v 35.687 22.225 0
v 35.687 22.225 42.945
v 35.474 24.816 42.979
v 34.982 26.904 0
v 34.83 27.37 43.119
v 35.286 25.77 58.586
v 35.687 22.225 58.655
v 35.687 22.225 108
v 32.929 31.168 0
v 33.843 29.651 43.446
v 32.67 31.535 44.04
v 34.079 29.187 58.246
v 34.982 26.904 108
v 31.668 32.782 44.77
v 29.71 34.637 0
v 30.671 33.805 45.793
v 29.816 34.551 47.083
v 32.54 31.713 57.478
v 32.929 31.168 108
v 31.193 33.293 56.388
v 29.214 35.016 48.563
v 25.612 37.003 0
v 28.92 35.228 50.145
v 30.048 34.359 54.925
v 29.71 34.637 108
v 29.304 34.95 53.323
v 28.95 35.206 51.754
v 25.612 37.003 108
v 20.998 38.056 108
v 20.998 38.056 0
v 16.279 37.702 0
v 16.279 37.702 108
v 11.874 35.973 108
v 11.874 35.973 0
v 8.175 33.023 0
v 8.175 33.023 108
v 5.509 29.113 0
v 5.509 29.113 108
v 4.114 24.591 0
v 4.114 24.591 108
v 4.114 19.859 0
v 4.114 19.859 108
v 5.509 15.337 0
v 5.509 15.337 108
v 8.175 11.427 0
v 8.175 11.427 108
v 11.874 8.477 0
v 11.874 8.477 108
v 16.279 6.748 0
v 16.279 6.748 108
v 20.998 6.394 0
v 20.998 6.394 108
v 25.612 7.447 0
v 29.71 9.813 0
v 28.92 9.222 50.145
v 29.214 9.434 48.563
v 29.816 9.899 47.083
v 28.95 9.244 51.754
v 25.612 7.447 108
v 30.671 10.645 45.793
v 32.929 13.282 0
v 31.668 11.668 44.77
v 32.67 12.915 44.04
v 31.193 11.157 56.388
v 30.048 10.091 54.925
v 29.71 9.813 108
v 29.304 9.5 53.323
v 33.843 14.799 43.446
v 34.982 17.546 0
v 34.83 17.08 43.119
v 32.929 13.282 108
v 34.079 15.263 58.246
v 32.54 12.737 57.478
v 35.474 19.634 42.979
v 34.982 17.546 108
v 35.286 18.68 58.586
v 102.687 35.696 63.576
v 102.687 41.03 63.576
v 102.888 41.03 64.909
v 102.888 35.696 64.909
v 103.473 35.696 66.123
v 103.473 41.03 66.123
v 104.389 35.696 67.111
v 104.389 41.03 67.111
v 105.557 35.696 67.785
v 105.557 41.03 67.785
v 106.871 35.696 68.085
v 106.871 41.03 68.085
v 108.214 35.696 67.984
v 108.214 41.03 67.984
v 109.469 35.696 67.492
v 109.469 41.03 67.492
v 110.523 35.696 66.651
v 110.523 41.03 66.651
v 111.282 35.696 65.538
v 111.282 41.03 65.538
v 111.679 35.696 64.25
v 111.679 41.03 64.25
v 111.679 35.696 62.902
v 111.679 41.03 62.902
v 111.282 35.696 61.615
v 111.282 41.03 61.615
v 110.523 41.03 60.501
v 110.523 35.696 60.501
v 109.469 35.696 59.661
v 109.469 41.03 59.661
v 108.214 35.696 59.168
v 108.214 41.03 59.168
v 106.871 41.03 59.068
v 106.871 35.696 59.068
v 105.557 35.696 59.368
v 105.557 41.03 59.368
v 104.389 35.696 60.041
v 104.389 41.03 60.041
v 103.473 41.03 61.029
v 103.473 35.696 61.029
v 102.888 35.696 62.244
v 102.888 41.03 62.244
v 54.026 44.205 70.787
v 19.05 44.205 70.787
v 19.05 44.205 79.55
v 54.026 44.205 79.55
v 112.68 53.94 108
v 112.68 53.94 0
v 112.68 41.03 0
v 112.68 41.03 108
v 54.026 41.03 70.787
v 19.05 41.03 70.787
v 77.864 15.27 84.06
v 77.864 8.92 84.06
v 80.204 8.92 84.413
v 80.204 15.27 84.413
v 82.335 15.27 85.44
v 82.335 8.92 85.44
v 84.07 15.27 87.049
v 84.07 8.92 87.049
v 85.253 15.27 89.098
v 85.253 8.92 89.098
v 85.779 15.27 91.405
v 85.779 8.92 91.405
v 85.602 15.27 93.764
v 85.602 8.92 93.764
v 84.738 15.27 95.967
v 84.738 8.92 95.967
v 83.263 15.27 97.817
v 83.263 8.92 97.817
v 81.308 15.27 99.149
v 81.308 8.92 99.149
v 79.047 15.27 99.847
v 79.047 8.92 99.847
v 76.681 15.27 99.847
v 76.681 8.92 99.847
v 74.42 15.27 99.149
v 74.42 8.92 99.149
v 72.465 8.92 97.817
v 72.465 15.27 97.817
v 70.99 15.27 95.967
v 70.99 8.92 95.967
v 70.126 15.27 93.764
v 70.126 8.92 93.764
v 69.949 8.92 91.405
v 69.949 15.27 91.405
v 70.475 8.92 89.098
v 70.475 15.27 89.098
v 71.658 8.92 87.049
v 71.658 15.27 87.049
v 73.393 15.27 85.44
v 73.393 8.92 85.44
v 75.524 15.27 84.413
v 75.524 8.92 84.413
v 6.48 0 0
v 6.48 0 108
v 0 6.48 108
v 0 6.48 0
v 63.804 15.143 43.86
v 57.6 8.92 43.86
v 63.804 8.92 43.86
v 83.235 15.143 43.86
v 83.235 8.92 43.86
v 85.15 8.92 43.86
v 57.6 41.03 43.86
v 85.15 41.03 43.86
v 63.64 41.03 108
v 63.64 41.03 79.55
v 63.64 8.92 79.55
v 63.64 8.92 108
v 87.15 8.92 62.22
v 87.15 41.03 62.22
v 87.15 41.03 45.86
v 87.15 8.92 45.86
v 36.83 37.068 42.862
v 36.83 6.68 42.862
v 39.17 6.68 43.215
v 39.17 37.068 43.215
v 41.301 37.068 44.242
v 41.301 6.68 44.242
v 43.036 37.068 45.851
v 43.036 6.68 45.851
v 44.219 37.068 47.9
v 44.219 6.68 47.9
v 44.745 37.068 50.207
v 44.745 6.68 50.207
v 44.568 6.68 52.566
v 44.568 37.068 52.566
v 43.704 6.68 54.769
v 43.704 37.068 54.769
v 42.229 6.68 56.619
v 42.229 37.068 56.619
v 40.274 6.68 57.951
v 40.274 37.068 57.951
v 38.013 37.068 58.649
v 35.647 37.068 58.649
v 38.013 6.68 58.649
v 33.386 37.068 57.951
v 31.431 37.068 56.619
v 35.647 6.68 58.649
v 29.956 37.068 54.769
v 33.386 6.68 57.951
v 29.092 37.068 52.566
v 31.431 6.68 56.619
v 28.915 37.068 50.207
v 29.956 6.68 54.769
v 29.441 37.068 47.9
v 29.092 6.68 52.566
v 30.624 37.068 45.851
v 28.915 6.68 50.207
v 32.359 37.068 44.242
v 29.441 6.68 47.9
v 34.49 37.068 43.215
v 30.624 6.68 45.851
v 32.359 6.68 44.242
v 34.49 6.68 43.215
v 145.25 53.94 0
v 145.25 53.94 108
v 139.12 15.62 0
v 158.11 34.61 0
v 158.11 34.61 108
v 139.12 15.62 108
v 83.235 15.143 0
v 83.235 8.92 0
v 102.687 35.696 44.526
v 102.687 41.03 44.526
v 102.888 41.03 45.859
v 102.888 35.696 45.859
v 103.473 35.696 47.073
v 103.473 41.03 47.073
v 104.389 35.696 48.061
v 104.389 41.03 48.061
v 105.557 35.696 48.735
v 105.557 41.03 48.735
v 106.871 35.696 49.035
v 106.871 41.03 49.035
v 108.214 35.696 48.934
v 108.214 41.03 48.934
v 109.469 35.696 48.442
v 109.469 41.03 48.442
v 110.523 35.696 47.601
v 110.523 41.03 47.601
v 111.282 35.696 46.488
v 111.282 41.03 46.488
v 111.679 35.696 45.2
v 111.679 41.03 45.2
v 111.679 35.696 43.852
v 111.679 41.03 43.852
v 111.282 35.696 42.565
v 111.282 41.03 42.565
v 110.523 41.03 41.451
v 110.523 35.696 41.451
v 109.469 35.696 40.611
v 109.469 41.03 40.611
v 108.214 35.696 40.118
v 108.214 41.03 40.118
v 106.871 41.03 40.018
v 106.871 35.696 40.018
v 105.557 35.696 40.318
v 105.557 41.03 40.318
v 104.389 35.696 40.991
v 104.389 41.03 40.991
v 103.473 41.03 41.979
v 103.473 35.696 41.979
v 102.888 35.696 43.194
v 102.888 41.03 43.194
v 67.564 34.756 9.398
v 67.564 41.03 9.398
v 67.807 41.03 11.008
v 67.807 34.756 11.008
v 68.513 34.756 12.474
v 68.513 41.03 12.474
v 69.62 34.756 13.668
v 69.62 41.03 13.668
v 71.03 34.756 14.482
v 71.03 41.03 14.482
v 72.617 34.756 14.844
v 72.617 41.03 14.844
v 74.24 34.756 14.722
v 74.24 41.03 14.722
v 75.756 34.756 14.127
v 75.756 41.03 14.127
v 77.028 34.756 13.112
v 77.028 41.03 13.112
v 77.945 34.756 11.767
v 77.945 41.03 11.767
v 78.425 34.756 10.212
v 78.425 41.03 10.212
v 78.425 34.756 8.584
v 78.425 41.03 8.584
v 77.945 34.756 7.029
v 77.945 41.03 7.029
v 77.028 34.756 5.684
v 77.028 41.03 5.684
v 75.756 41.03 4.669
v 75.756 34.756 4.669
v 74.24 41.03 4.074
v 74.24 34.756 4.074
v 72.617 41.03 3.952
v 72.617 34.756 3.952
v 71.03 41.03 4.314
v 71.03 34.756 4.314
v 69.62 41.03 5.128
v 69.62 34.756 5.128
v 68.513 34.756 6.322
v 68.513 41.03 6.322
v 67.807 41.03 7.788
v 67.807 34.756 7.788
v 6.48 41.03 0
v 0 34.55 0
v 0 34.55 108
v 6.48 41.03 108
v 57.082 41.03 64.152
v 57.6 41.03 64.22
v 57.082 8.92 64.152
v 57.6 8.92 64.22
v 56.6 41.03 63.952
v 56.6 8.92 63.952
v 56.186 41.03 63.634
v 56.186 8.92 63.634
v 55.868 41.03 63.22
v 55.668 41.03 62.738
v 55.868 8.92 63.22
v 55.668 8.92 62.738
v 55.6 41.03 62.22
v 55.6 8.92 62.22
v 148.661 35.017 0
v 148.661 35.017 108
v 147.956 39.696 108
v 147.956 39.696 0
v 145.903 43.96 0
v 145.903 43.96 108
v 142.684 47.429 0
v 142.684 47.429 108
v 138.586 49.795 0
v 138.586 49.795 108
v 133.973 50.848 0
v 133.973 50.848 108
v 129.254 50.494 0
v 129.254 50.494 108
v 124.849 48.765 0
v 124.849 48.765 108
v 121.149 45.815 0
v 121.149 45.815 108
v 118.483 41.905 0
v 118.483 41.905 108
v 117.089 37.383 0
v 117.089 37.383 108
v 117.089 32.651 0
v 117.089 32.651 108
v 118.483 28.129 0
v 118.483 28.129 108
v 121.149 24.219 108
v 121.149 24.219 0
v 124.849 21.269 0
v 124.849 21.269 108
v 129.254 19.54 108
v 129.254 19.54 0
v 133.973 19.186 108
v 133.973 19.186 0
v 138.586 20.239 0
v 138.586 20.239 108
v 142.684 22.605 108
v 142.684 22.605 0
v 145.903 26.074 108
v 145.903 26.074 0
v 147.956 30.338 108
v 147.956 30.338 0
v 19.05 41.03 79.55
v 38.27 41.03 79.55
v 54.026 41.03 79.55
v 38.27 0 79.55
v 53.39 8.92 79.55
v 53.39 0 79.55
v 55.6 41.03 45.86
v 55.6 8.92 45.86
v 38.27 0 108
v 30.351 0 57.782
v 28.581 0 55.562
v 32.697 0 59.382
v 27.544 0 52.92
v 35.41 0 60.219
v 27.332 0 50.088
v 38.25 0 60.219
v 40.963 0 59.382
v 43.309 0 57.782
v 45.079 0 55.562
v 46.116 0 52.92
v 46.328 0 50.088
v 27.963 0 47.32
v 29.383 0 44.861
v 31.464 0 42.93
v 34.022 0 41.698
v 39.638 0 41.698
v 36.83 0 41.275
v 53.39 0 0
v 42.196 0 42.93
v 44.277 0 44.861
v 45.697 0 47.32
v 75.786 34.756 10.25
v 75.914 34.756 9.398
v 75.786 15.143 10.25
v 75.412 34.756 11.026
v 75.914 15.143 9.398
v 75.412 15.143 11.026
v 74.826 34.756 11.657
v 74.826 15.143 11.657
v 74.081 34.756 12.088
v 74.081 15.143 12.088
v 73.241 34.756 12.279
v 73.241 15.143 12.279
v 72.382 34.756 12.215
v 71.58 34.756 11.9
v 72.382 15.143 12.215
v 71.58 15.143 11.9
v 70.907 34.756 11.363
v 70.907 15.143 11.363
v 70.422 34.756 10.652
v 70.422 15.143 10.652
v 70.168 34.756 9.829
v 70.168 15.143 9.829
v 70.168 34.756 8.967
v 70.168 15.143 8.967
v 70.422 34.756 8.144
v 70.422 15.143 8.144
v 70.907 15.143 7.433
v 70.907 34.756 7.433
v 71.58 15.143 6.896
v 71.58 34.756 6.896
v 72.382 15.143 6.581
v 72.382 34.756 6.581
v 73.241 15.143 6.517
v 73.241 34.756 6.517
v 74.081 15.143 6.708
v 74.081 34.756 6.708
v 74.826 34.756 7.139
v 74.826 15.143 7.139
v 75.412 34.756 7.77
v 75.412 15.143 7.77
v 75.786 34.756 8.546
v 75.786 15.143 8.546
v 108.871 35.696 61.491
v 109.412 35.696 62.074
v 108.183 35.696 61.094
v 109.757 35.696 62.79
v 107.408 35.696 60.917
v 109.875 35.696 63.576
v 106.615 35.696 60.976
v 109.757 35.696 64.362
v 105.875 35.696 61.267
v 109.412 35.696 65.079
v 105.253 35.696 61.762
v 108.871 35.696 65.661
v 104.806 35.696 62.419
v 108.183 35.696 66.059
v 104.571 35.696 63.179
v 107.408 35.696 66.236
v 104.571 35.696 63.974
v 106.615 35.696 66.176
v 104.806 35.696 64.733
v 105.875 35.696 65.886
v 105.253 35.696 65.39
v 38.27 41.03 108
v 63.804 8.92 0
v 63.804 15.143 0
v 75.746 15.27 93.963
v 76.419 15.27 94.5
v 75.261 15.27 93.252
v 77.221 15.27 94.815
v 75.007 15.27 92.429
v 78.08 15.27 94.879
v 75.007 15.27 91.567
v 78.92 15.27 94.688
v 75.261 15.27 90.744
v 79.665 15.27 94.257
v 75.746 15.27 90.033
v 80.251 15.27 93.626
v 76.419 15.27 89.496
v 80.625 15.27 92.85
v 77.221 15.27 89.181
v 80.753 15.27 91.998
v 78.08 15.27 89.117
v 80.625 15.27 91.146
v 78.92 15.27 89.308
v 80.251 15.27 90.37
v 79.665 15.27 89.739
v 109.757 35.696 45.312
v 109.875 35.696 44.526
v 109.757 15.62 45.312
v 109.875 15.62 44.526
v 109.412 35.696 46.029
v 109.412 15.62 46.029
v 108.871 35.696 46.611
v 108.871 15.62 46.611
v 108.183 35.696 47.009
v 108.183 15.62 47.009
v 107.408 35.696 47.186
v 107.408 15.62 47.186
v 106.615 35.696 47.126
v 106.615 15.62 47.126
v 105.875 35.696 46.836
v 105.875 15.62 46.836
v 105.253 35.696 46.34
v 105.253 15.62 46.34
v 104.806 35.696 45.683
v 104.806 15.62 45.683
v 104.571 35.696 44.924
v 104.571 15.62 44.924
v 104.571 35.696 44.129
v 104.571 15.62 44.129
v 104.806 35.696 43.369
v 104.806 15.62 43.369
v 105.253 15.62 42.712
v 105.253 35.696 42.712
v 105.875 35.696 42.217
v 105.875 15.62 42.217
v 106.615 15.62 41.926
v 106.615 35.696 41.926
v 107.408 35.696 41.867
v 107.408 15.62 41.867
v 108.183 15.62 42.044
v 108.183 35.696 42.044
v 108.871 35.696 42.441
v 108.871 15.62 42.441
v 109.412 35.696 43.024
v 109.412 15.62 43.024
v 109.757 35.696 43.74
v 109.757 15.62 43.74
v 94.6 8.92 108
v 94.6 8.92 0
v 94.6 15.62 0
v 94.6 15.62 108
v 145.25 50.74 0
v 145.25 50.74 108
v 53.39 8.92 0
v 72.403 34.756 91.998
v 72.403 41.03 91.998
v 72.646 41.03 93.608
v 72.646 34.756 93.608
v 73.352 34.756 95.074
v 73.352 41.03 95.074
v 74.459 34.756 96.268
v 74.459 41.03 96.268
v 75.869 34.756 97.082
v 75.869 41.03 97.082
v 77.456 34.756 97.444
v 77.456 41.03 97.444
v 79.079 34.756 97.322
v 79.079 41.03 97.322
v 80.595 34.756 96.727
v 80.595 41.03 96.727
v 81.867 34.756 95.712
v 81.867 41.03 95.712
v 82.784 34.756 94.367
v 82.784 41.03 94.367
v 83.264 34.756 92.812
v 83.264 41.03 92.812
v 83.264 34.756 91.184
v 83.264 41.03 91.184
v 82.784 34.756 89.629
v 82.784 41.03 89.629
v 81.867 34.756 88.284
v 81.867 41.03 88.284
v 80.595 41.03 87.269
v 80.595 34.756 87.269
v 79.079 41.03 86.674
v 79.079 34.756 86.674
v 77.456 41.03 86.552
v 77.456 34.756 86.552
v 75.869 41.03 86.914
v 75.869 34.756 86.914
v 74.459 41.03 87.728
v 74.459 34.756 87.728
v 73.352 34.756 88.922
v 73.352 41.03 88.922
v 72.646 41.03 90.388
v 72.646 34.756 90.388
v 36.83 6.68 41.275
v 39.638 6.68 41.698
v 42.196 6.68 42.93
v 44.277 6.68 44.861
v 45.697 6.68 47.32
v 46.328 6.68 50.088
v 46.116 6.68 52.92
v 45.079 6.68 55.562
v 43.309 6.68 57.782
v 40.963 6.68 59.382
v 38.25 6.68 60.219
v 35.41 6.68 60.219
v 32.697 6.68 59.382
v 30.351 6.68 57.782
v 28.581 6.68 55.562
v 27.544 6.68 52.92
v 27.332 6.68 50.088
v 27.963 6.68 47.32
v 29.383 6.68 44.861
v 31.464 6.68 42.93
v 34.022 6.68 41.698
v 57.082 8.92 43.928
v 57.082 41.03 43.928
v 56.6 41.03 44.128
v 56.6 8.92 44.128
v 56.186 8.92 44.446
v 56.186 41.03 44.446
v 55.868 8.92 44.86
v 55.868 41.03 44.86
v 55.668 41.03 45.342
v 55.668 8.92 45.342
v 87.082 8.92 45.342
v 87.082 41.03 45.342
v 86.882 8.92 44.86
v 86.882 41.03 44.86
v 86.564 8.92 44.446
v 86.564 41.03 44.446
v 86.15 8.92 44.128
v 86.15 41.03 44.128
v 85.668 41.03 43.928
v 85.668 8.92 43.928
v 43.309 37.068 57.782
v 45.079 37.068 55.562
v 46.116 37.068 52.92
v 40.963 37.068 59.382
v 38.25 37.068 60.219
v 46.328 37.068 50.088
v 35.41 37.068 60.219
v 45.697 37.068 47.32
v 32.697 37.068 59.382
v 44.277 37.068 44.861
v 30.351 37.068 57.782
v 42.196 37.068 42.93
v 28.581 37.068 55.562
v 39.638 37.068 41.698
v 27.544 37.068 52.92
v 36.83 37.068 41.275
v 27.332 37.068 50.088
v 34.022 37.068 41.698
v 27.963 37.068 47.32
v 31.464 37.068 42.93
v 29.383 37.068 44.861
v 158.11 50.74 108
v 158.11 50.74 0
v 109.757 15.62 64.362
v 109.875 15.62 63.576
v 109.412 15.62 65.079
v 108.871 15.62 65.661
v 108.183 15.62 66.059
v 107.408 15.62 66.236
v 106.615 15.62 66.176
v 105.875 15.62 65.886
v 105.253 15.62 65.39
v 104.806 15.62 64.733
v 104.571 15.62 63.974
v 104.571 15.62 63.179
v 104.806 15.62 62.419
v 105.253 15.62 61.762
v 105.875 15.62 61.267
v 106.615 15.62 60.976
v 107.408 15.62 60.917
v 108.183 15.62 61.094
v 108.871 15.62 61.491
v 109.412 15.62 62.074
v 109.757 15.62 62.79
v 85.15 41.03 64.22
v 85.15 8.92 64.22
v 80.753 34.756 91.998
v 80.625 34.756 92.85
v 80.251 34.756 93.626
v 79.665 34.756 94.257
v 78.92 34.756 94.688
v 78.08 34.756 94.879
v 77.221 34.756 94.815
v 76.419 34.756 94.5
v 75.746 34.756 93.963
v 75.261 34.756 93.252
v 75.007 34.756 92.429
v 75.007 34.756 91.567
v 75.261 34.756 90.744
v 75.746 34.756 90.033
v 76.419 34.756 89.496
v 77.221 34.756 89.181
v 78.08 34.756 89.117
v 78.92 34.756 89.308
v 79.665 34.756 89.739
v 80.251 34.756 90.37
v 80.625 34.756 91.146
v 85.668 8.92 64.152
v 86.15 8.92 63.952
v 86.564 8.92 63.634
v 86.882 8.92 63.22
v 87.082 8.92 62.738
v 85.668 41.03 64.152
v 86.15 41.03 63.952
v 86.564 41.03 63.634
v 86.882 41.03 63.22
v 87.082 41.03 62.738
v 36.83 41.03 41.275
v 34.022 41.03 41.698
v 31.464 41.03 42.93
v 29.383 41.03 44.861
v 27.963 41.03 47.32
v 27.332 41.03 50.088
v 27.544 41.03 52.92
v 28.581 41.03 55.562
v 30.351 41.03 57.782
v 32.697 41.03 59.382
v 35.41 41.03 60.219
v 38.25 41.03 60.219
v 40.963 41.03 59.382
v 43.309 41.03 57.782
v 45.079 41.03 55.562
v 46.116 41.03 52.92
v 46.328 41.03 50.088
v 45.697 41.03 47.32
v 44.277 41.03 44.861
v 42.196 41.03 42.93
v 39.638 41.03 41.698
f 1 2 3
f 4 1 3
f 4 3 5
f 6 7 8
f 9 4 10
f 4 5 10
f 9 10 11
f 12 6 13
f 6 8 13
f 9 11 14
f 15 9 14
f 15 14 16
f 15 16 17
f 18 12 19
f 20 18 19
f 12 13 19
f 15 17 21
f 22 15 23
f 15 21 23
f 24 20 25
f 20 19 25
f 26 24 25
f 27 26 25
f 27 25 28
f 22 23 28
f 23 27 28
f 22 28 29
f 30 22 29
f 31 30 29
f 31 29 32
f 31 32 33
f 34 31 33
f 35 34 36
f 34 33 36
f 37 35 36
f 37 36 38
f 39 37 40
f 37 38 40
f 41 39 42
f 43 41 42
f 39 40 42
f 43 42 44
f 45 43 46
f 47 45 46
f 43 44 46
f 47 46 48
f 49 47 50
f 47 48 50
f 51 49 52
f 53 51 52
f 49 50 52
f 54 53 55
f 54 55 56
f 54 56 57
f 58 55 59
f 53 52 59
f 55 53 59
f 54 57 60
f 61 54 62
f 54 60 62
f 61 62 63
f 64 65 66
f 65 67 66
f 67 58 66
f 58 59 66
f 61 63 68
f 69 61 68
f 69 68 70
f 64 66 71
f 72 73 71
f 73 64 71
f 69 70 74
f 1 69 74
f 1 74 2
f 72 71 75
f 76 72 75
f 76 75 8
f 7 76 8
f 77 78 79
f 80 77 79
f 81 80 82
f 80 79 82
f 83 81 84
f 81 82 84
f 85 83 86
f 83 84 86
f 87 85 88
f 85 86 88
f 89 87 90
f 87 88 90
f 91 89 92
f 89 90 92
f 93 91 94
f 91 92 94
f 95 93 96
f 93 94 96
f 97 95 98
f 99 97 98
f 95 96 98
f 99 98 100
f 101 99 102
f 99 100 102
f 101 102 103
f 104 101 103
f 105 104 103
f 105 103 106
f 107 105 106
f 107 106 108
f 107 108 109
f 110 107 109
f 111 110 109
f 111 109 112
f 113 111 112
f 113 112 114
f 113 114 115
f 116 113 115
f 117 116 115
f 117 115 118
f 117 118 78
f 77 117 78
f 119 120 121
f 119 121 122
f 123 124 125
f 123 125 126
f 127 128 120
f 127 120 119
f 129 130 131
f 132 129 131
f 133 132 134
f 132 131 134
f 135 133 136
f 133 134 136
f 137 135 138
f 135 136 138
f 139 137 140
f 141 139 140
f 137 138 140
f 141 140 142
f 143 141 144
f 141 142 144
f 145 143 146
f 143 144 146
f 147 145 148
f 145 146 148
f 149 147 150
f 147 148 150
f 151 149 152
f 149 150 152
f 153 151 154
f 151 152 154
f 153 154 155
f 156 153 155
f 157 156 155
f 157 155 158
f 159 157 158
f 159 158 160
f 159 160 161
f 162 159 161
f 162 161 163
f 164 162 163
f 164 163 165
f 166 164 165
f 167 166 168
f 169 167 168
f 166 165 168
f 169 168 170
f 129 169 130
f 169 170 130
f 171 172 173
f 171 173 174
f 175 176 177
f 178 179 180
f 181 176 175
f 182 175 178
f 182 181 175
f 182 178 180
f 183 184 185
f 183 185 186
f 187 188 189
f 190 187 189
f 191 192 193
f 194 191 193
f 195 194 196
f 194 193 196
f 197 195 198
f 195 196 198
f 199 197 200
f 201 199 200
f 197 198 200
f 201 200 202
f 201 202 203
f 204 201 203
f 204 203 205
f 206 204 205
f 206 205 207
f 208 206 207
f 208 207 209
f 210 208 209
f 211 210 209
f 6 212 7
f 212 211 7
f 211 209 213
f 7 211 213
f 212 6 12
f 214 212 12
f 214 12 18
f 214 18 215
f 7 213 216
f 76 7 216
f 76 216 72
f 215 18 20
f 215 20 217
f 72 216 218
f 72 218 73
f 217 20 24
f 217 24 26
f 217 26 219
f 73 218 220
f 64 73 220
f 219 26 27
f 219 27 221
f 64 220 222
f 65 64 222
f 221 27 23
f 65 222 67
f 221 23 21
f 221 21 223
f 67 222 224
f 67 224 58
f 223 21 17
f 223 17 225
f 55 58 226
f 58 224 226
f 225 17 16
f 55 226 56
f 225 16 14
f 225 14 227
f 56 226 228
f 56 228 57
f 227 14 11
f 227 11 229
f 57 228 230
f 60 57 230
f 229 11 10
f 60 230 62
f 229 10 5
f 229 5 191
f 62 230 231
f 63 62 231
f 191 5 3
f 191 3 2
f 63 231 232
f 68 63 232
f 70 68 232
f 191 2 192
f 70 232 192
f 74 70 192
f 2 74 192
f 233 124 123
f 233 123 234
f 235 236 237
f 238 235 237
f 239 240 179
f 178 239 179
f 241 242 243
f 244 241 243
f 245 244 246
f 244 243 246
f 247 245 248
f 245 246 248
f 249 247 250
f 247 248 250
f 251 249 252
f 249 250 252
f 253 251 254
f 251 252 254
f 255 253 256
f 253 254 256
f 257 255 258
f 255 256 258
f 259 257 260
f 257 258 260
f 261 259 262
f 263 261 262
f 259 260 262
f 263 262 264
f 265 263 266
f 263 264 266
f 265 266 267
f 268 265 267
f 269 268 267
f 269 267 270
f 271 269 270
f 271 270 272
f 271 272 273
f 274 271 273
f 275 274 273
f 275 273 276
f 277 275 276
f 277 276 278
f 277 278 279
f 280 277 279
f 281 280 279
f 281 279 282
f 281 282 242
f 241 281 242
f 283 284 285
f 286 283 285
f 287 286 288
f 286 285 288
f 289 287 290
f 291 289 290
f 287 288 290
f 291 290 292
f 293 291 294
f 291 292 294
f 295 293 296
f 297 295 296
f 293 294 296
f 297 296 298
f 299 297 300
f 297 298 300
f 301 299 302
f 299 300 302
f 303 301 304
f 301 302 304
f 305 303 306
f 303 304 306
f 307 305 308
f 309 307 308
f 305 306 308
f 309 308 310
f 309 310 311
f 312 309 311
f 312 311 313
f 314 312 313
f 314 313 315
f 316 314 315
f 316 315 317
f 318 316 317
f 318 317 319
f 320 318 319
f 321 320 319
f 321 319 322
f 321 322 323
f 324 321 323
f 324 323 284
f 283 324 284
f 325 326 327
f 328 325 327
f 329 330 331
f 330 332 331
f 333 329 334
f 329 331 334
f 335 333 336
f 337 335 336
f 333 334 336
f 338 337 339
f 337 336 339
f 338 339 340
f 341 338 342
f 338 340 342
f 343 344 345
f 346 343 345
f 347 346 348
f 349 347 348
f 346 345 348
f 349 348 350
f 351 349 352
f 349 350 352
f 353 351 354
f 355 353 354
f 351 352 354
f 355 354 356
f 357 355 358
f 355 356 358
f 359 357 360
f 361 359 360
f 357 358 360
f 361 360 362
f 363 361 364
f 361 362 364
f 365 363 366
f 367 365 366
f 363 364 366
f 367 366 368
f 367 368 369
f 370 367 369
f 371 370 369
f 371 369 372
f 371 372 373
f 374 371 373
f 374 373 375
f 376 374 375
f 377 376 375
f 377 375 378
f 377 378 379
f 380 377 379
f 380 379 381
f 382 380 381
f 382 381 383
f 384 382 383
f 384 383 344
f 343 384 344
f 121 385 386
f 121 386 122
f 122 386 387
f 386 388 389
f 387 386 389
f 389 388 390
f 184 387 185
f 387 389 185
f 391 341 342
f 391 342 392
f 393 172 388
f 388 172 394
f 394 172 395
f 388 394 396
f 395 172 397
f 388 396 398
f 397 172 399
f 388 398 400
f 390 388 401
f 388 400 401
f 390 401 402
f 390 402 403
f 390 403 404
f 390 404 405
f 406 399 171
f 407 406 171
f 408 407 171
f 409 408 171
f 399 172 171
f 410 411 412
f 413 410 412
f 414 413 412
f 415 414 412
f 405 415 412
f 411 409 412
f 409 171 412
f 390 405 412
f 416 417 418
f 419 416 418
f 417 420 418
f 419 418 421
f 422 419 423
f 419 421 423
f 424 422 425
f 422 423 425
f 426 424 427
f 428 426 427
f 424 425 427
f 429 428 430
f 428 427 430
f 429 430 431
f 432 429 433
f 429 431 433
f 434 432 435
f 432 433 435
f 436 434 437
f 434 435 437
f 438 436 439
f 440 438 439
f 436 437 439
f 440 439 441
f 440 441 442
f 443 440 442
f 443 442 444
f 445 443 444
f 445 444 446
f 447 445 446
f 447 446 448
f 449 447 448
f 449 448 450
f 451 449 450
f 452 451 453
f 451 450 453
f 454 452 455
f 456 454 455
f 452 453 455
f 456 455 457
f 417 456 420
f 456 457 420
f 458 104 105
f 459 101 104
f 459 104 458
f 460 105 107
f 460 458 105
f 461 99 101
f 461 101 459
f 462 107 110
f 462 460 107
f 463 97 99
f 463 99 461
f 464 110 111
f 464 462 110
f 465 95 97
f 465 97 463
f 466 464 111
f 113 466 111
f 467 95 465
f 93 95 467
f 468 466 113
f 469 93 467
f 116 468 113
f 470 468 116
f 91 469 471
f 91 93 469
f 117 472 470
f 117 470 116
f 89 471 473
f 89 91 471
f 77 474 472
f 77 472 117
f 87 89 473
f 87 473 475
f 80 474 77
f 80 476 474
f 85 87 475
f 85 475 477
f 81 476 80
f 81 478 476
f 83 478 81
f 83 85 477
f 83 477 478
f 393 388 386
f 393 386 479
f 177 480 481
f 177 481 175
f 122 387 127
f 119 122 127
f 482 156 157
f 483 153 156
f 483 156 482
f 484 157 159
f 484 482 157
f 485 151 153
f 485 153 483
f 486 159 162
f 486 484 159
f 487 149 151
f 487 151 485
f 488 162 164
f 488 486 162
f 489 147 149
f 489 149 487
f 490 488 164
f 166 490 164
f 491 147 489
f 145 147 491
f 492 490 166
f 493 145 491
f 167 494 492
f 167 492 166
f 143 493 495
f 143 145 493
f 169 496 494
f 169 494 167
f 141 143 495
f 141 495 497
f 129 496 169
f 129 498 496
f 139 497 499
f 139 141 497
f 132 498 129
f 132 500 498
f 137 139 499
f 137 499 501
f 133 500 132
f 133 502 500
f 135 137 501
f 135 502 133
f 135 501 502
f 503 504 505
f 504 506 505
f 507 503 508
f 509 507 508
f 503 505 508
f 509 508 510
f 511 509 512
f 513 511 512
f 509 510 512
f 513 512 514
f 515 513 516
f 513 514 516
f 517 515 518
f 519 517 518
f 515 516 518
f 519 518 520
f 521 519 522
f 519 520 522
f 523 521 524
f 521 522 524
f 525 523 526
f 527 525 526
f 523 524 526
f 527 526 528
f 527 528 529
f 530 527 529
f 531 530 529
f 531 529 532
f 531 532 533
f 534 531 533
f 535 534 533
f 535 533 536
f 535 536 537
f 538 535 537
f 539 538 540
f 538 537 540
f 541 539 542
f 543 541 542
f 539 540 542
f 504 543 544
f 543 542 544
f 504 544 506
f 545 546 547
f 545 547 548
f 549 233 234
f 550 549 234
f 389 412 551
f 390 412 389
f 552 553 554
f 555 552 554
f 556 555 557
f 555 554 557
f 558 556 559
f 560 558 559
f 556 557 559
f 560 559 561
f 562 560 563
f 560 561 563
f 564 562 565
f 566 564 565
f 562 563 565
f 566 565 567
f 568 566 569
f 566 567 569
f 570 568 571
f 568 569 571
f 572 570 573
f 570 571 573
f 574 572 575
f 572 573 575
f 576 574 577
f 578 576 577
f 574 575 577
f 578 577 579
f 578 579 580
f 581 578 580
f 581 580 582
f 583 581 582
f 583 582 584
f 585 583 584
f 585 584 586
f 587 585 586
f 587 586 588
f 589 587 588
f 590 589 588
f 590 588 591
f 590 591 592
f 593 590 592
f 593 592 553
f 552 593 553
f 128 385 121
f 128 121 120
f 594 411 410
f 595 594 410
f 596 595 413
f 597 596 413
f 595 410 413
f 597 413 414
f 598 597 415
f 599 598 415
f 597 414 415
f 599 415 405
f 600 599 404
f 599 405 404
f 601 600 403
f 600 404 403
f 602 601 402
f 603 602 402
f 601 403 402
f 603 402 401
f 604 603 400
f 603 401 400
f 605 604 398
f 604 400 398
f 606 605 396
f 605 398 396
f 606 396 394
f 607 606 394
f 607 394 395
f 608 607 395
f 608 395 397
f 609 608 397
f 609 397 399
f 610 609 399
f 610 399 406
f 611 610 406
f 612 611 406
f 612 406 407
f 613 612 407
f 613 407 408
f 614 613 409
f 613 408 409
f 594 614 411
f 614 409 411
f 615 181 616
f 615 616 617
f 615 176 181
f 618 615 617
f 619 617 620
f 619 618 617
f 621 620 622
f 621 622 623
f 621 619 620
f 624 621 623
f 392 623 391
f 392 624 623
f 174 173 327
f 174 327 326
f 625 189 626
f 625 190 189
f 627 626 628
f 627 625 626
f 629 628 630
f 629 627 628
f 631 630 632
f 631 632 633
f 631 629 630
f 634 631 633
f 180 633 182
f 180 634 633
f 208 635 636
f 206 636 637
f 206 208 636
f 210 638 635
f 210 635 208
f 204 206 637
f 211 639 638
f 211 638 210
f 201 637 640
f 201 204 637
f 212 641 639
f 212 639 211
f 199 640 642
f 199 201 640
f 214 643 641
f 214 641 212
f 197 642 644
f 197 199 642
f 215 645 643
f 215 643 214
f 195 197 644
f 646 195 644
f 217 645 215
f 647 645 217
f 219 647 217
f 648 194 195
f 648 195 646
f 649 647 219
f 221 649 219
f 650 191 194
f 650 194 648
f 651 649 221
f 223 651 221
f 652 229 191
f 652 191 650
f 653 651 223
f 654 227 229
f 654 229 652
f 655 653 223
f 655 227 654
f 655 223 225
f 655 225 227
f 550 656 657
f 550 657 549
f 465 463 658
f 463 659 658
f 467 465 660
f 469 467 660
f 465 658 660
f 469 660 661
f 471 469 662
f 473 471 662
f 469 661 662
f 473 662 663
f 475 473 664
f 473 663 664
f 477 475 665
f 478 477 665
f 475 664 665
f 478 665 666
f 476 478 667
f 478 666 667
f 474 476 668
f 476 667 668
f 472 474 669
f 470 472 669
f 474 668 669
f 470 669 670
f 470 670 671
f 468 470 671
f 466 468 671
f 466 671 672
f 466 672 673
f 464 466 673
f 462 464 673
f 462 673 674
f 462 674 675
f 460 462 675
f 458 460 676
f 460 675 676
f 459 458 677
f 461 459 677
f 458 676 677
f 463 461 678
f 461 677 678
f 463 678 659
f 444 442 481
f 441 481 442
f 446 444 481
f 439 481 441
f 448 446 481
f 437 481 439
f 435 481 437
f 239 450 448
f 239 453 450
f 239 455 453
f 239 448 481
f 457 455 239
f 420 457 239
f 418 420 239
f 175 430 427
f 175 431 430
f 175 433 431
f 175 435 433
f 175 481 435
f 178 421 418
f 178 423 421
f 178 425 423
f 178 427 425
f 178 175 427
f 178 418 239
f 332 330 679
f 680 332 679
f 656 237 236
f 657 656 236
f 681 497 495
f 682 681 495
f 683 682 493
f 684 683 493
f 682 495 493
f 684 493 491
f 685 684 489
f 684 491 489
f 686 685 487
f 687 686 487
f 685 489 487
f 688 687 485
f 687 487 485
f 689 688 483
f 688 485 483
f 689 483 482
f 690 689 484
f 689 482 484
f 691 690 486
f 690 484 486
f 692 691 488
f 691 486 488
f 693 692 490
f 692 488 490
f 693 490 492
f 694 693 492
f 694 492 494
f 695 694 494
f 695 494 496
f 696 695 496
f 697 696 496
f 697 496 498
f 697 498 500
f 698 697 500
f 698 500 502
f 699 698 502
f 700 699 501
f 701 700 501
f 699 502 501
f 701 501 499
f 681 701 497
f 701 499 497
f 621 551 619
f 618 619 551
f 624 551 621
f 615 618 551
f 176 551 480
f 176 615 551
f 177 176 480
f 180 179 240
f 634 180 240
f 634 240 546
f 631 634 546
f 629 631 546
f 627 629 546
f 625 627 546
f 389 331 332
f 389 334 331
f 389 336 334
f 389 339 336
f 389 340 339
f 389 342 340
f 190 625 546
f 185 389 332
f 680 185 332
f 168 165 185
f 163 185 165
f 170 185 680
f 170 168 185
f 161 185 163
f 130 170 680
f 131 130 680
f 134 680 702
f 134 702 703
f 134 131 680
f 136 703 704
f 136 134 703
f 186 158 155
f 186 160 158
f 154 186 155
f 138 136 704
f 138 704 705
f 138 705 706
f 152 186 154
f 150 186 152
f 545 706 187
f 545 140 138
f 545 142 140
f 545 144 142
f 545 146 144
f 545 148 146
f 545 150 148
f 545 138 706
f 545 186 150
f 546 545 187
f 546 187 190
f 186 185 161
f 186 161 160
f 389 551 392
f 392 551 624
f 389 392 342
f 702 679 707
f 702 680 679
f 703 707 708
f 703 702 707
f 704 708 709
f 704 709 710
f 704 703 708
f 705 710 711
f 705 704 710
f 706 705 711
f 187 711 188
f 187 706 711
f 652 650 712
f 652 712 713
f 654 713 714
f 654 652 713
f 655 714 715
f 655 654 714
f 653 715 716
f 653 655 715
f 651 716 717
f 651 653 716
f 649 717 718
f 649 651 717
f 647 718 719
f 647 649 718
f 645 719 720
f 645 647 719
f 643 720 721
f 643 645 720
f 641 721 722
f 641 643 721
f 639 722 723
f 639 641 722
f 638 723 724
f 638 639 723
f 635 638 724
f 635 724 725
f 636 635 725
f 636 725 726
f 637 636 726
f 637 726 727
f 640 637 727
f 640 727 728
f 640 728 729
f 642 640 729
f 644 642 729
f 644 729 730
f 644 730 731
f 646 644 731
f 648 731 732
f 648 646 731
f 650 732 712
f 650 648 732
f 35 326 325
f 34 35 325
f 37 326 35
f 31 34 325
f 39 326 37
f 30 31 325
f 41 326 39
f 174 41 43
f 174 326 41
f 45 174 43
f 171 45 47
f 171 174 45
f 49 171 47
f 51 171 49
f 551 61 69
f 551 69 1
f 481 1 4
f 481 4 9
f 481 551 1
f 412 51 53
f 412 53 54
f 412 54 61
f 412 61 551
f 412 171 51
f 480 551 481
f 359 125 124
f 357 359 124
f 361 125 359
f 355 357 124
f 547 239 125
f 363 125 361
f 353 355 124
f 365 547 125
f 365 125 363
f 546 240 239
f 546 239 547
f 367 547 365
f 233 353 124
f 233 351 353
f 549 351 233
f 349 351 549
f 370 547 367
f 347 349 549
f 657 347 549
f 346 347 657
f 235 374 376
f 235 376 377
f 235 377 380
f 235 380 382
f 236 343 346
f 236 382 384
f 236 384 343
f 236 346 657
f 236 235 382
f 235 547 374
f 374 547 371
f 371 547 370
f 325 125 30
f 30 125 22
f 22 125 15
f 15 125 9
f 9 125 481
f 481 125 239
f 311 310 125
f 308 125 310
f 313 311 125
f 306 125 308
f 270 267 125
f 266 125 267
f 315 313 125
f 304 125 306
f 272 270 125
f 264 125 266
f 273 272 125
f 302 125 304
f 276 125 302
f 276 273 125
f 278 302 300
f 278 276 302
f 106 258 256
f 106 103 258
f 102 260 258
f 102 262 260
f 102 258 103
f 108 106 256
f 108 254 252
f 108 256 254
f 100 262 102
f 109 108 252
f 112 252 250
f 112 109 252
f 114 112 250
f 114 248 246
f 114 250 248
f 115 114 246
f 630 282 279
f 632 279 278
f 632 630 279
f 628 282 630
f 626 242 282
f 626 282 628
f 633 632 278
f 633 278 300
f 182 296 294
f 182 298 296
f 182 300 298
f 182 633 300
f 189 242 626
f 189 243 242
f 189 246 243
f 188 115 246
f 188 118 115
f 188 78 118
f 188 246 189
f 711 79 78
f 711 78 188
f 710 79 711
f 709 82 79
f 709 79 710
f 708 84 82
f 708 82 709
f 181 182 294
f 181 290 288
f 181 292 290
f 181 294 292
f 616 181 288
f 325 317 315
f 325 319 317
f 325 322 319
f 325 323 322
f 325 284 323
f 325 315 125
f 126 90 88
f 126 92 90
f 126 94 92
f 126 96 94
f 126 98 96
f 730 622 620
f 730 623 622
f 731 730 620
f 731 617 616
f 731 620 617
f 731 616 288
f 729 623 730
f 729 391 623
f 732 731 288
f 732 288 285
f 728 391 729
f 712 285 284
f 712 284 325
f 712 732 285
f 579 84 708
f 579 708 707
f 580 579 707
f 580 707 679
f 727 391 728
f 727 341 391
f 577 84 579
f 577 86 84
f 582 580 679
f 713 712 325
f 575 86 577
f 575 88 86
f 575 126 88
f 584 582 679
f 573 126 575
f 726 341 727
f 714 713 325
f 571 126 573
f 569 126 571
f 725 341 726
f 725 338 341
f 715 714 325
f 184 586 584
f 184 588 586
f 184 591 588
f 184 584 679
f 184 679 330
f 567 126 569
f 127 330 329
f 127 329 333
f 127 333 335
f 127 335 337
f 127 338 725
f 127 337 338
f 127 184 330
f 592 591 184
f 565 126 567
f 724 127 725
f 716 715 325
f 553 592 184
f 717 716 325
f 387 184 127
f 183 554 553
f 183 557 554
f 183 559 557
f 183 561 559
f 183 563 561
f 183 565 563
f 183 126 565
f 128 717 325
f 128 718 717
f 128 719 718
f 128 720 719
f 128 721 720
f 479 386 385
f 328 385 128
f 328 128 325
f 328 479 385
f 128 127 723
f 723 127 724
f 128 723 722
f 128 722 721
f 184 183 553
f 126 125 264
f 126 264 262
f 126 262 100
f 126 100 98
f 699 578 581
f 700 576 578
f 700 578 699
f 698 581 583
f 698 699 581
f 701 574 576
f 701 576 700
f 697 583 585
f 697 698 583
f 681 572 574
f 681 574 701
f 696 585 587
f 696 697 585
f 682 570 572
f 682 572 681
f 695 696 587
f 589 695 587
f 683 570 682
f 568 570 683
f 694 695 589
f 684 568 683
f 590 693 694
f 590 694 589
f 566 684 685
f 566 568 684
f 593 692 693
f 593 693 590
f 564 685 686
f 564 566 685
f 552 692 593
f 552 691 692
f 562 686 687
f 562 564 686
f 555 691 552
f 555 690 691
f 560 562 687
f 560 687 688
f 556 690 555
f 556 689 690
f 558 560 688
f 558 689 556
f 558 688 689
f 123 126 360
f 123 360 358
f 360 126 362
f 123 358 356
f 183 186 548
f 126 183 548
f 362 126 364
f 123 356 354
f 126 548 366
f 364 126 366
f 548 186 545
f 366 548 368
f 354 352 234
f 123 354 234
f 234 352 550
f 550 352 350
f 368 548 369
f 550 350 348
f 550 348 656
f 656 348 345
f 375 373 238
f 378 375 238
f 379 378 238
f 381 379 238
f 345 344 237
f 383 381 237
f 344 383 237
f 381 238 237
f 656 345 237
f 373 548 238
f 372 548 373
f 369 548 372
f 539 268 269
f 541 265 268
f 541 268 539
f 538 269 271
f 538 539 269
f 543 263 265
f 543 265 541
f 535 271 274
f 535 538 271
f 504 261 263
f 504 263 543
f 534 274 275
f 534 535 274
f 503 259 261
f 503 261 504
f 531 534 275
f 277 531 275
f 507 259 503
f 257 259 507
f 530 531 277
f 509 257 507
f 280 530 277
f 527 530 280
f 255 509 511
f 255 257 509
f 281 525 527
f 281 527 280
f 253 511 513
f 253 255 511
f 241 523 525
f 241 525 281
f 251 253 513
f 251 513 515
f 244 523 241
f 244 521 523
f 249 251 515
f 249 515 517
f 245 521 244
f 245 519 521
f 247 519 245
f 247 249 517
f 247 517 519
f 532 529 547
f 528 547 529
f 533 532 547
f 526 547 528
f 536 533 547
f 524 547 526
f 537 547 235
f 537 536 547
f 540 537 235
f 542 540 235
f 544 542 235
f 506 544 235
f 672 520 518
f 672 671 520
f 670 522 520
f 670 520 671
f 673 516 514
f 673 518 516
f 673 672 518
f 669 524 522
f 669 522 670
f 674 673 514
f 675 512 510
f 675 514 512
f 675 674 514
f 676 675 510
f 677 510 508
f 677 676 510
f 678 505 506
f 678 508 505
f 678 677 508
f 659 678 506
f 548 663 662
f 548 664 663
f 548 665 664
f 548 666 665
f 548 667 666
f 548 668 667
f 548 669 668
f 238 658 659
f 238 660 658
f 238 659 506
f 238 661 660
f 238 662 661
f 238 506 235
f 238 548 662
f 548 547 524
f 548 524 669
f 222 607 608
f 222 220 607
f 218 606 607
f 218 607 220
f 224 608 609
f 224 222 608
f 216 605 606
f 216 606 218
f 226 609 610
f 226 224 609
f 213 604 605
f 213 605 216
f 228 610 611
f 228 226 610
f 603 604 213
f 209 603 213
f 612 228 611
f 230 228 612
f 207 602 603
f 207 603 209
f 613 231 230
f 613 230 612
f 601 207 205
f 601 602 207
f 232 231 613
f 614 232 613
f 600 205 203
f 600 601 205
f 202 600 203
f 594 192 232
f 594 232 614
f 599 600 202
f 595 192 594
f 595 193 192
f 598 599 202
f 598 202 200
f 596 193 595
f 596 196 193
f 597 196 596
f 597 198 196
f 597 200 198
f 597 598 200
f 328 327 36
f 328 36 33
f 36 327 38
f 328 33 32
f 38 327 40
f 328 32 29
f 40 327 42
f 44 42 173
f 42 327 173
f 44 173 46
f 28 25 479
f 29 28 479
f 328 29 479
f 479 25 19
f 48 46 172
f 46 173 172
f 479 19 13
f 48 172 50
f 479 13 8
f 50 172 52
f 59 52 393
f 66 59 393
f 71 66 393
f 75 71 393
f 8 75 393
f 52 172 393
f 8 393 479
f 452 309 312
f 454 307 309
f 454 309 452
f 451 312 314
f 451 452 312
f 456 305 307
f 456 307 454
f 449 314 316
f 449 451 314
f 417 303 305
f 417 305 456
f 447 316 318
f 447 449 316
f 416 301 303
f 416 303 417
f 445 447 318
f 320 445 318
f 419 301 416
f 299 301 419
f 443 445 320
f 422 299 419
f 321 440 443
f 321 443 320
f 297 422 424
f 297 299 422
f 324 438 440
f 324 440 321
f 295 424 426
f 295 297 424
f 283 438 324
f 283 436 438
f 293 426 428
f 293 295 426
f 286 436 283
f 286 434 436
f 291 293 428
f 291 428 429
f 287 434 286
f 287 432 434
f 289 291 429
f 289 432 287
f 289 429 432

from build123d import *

# Parameters (mm, degrees)
SKETCH1_W           = 158.11
SKETCH1_H           = 108
BOSS_EXTRUDE1_DEPTH = 53.94
SKETCH2_W           = 12.86
SKETCH2_H           = 108
CUT_EXTRUDE1_DEPTH  = 3.2
SKETCH3_W           = 112.68
SKETCH3_H           = 108
CUT_EXTRUDE2_DEPTH  = 12.91
SKETCH4_W           = 104.72
SKETCH4_H           = 108
CUT_EXTRUDE3_DEPTH  = 8.92
SKETCH5_W           = 63.51
SKETCH5_H           = 189.255900931
CUT_EXTRUDE4_DEPTH  = 15.62
SKETCH6_W           = 25.37
SKETCH6_H           = 28.45
CUT_EXTRUDE5_DEPTH  = 199.927865569
SKETCH7_W           = 31.55
SKETCH7_H           = 20.36
CUT_EXTRUDE6_DEPTH  = 196.82194208
FILLET1_R           = 2
CHAMFER1_SIZE       = 6.48
CHAMFER2_SIZE       = 18.99
HOLE1_D             = 31.75
SKETCH10_W          = 19.431
SKETCH10_H          = 43.86
CUT_EXTRUDE7_DEPTH  = 6.223
SKETCH11_R          = 9.525
CUT_EXTRUDE10_DEPTH = 6.6802
SKETCH12_R          = 7.9375
CUT_EXTRUDE11_DEPTH = 198.221349747
CUT_EXTRUDE12_START = -3.9624
SKETCH13_R          = 9.525
CUT_EXTRUDE12_DEPTH = 3.9624
SKETCH14_W          = 34.9758
SKETCH14_H          = 8.763
BOSS_EXTRUDE2_DEPTH = 3.175
HOLE2_D             = 5.7785
HOLE2_CBORE_D       = 10.922
HOLE2_CBORE_DEPTH   = 6.2738
SKETCH18_R          = 7.9375
CUT_EXTRUDE13_DEPTH = 6.35
HOLE3_D             = 5.334
HOLE3_CBORE_D       = 9.0424
HOLE3_CBORE_DEPTH   = 5.334


with BuildPart() as part:
    # Sketch1 → Boss-Extrude1 (new body)
    with BuildSketch(Plane(origin=(0, 0, 0), x_dir=(1, 0, 0), z_dir=(0, 1, 0))):
        with Locations((79.055, -54)):
            Rectangle(SKETCH1_W, SKETCH1_H)
    extrude(amount=BOSS_EXTRUDE1_DEPTH)

    # Sketch2 → Cut-Extrude1 (cut)
    with BuildSketch(Plane(origin=(0, 53.94, 0), x_dir=(-1, 0, 0), z_dir=(0, 1, 0))):
        with Locations((-151.68, 54)):
            Rectangle(SKETCH2_W, SKETCH2_H)
    extrude(amount=-CUT_EXTRUDE1_DEPTH, mode=Mode.SUBTRACT)

    # Sketch3 → Cut-Extrude2 (cut)
    with BuildSketch(Plane(origin=(0, 53.94, 0), x_dir=(-1, 0, 0), z_dir=(0, 1, 0))):
        with Locations((-56.34, 54)):
            Rectangle(SKETCH3_W, SKETCH3_H)
    extrude(amount=-CUT_EXTRUDE2_DEPTH, mode=Mode.SUBTRACT)

    # Sketch4 → Cut-Extrude3 (cut)
    with BuildSketch(Plane.XZ):
        with Locations((105.75, 54)):
            Rectangle(SKETCH4_W, SKETCH4_H)
    extrude(amount=-CUT_EXTRUDE3_DEPTH, mode=Mode.SUBTRACT)

    # Sketch5 → Cut-Extrude4 (cut)
    with BuildSketch(Plane.XZ):
        with Locations((126.355, 87.843662975)):
            Rectangle(SKETCH5_W, SKETCH5_H)
    extrude(amount=-CUT_EXTRUDE4_DEPTH, mode=Mode.SUBTRACT)

    # Sketch6 → Cut-Extrude5 (cut, through all)
    with BuildSketch(Plane(origin=(0, 53.94, 0), x_dir=(-1, 0, 0), z_dir=(0, 1, 0))):
        with Locations((-50.955, 93.775)):
            Rectangle(SKETCH6_W, SKETCH6_H)
    extrude(amount=-CUT_EXTRUDE5_DEPTH, mode=Mode.SUBTRACT)

    # Sketch7 → Cut-Extrude6 (cut, through all)
    with BuildSketch(Plane(origin=(0, 41.03, 0), x_dir=(1, 0, 0), z_dir=(0, 1, 0))):
        with Locations((71.375, -54.04)):
            Rectangle(SKETCH7_W, SKETCH7_H)
    extrude(amount=-CUT_EXTRUDE6_DEPTH, mode=Mode.SUBTRACT)

    # Fillet1
    fillet1_edges = [part.edges().sort_by_distance(p)[0] for p in [
        (55.6, 24.975, 64.22),
        (55.6, 24.975, 43.86),
        (87.15, 24.975, 43.86),
        (87.15, 24.975, 64.22),
    ]]
    fillet(fillet1_edges, radius=FILLET1_R)

    # Chamfer1
    chamfer1_edges = [part.edges().sort_by_distance(p)[0] for p in [
        (0, 41.03, 54),
        (0, 0, 54),
    ]]
    chamfer(chamfer1_edges, length=CHAMFER1_SIZE)

    # Chamfer2
    chamfer2_edges = [part.edges().sort_by_distance(p)[0] for p in [
        (158.11, 15.62, 54),
    ]]
    chamfer(chamfer2_edges, length=CHAMFER2_SIZE)

    # Hole1 (through all)
    with Locations(Plane(origin=(0, 0, 0), x_dir=(-1, 0, 0), z_dir=(0, 0, -1))):
        with Locations((-19.812, 22.225), (-132.7862, 35.017)):
            Hole(HOLE1_D / 2)

    # Sketch10 → Cut-Extrude7 (cut)
    with BuildSketch(Plane.XZ.offset(-8.92)):
        with Locations((73.5195, 21.93)):
            Rectangle(SKETCH10_W, SKETCH10_H)
    extrude(amount=-CUT_EXTRUDE7_DEPTH, mode=Mode.SUBTRACT)

    # Sketch11 → Cut-Extrude10 (cut)
    with BuildSketch(Plane.XZ):
        with Locations(Location((36.83, 50.8, 0), (0, 0, 270))):
            Circle(SKETCH11_R)
    extrude(amount=-CUT_EXTRUDE10_DEPTH, mode=Mode.SUBTRACT)

    # Sketch12 → Cut-Extrude11 (cut, through all)
    with BuildSketch(Plane.XZ.offset(-6.6802)):
        with Locations(Location((36.83, 50.8, 0), (0, 0, 270))):
            Circle(SKETCH12_R)
    extrude(amount=-CUT_EXTRUDE11_DEPTH, mode=Mode.SUBTRACT)

    # Sketch13 → Cut-Extrude12 (cut)
    with BuildSketch(Plane(origin=(0, 41.03, 0), x_dir=(-1, 0, 0), z_dir=(0, 1, 0)).offset(CUT_EXTRUDE12_START)):
        with Locations(Location((-36.83, 50.8, 0), (0, 0, 270))):
            Circle(SKETCH13_R)
    extrude(amount=CUT_EXTRUDE12_DEPTH, mode=Mode.SUBTRACT)

    # Sketch14 → Boss-Extrude2 (add)
    with BuildSketch(Plane(origin=(0, 41.03, 0), x_dir=(1, 0, 0), z_dir=(0, 1, 0))):
        with Locations((36.5379, -75.1685)):
            Rectangle(SKETCH14_W, SKETCH14_H)
    extrude(amount=BOSS_EXTRUDE2_DEPTH)

    # Hole2 (through all)
    with Locations(Plane(origin=(0, 41.03, 0), x_dir=(-1, 0, 0), z_dir=(0, 1, 0))):
        with Locations((-73.025, 9.398), (-77.864, 91.998)):
            CounterBoreHole(HOLE2_D / 2, HOLE2_CBORE_D / 2, HOLE2_CBORE_DEPTH)

    # Sketch18 → Cut-Extrude13 (cut)
    with BuildSketch(Plane.XZ.offset(-8.92)):
        with Locations(Location((77.864, 91.998, 0), (0, 0, 270))):
            Circle(SKETCH18_R)
    extrude(amount=-CUT_EXTRUDE13_DEPTH, mode=Mode.SUBTRACT)

    # Hole3 (through all)
    with Locations(Plane(origin=(0, 41.03, 0), x_dir=(-1, 0, 0), z_dir=(0, 1, 0))):
        with Locations((-107.2084, 44.5262), (-107.2084, 63.5762)):
            CounterBoreHole(HOLE3_D / 2, HOLE3_CBORE_D / 2, HOLE3_CBORE_DEPTH)


solid = part.part
